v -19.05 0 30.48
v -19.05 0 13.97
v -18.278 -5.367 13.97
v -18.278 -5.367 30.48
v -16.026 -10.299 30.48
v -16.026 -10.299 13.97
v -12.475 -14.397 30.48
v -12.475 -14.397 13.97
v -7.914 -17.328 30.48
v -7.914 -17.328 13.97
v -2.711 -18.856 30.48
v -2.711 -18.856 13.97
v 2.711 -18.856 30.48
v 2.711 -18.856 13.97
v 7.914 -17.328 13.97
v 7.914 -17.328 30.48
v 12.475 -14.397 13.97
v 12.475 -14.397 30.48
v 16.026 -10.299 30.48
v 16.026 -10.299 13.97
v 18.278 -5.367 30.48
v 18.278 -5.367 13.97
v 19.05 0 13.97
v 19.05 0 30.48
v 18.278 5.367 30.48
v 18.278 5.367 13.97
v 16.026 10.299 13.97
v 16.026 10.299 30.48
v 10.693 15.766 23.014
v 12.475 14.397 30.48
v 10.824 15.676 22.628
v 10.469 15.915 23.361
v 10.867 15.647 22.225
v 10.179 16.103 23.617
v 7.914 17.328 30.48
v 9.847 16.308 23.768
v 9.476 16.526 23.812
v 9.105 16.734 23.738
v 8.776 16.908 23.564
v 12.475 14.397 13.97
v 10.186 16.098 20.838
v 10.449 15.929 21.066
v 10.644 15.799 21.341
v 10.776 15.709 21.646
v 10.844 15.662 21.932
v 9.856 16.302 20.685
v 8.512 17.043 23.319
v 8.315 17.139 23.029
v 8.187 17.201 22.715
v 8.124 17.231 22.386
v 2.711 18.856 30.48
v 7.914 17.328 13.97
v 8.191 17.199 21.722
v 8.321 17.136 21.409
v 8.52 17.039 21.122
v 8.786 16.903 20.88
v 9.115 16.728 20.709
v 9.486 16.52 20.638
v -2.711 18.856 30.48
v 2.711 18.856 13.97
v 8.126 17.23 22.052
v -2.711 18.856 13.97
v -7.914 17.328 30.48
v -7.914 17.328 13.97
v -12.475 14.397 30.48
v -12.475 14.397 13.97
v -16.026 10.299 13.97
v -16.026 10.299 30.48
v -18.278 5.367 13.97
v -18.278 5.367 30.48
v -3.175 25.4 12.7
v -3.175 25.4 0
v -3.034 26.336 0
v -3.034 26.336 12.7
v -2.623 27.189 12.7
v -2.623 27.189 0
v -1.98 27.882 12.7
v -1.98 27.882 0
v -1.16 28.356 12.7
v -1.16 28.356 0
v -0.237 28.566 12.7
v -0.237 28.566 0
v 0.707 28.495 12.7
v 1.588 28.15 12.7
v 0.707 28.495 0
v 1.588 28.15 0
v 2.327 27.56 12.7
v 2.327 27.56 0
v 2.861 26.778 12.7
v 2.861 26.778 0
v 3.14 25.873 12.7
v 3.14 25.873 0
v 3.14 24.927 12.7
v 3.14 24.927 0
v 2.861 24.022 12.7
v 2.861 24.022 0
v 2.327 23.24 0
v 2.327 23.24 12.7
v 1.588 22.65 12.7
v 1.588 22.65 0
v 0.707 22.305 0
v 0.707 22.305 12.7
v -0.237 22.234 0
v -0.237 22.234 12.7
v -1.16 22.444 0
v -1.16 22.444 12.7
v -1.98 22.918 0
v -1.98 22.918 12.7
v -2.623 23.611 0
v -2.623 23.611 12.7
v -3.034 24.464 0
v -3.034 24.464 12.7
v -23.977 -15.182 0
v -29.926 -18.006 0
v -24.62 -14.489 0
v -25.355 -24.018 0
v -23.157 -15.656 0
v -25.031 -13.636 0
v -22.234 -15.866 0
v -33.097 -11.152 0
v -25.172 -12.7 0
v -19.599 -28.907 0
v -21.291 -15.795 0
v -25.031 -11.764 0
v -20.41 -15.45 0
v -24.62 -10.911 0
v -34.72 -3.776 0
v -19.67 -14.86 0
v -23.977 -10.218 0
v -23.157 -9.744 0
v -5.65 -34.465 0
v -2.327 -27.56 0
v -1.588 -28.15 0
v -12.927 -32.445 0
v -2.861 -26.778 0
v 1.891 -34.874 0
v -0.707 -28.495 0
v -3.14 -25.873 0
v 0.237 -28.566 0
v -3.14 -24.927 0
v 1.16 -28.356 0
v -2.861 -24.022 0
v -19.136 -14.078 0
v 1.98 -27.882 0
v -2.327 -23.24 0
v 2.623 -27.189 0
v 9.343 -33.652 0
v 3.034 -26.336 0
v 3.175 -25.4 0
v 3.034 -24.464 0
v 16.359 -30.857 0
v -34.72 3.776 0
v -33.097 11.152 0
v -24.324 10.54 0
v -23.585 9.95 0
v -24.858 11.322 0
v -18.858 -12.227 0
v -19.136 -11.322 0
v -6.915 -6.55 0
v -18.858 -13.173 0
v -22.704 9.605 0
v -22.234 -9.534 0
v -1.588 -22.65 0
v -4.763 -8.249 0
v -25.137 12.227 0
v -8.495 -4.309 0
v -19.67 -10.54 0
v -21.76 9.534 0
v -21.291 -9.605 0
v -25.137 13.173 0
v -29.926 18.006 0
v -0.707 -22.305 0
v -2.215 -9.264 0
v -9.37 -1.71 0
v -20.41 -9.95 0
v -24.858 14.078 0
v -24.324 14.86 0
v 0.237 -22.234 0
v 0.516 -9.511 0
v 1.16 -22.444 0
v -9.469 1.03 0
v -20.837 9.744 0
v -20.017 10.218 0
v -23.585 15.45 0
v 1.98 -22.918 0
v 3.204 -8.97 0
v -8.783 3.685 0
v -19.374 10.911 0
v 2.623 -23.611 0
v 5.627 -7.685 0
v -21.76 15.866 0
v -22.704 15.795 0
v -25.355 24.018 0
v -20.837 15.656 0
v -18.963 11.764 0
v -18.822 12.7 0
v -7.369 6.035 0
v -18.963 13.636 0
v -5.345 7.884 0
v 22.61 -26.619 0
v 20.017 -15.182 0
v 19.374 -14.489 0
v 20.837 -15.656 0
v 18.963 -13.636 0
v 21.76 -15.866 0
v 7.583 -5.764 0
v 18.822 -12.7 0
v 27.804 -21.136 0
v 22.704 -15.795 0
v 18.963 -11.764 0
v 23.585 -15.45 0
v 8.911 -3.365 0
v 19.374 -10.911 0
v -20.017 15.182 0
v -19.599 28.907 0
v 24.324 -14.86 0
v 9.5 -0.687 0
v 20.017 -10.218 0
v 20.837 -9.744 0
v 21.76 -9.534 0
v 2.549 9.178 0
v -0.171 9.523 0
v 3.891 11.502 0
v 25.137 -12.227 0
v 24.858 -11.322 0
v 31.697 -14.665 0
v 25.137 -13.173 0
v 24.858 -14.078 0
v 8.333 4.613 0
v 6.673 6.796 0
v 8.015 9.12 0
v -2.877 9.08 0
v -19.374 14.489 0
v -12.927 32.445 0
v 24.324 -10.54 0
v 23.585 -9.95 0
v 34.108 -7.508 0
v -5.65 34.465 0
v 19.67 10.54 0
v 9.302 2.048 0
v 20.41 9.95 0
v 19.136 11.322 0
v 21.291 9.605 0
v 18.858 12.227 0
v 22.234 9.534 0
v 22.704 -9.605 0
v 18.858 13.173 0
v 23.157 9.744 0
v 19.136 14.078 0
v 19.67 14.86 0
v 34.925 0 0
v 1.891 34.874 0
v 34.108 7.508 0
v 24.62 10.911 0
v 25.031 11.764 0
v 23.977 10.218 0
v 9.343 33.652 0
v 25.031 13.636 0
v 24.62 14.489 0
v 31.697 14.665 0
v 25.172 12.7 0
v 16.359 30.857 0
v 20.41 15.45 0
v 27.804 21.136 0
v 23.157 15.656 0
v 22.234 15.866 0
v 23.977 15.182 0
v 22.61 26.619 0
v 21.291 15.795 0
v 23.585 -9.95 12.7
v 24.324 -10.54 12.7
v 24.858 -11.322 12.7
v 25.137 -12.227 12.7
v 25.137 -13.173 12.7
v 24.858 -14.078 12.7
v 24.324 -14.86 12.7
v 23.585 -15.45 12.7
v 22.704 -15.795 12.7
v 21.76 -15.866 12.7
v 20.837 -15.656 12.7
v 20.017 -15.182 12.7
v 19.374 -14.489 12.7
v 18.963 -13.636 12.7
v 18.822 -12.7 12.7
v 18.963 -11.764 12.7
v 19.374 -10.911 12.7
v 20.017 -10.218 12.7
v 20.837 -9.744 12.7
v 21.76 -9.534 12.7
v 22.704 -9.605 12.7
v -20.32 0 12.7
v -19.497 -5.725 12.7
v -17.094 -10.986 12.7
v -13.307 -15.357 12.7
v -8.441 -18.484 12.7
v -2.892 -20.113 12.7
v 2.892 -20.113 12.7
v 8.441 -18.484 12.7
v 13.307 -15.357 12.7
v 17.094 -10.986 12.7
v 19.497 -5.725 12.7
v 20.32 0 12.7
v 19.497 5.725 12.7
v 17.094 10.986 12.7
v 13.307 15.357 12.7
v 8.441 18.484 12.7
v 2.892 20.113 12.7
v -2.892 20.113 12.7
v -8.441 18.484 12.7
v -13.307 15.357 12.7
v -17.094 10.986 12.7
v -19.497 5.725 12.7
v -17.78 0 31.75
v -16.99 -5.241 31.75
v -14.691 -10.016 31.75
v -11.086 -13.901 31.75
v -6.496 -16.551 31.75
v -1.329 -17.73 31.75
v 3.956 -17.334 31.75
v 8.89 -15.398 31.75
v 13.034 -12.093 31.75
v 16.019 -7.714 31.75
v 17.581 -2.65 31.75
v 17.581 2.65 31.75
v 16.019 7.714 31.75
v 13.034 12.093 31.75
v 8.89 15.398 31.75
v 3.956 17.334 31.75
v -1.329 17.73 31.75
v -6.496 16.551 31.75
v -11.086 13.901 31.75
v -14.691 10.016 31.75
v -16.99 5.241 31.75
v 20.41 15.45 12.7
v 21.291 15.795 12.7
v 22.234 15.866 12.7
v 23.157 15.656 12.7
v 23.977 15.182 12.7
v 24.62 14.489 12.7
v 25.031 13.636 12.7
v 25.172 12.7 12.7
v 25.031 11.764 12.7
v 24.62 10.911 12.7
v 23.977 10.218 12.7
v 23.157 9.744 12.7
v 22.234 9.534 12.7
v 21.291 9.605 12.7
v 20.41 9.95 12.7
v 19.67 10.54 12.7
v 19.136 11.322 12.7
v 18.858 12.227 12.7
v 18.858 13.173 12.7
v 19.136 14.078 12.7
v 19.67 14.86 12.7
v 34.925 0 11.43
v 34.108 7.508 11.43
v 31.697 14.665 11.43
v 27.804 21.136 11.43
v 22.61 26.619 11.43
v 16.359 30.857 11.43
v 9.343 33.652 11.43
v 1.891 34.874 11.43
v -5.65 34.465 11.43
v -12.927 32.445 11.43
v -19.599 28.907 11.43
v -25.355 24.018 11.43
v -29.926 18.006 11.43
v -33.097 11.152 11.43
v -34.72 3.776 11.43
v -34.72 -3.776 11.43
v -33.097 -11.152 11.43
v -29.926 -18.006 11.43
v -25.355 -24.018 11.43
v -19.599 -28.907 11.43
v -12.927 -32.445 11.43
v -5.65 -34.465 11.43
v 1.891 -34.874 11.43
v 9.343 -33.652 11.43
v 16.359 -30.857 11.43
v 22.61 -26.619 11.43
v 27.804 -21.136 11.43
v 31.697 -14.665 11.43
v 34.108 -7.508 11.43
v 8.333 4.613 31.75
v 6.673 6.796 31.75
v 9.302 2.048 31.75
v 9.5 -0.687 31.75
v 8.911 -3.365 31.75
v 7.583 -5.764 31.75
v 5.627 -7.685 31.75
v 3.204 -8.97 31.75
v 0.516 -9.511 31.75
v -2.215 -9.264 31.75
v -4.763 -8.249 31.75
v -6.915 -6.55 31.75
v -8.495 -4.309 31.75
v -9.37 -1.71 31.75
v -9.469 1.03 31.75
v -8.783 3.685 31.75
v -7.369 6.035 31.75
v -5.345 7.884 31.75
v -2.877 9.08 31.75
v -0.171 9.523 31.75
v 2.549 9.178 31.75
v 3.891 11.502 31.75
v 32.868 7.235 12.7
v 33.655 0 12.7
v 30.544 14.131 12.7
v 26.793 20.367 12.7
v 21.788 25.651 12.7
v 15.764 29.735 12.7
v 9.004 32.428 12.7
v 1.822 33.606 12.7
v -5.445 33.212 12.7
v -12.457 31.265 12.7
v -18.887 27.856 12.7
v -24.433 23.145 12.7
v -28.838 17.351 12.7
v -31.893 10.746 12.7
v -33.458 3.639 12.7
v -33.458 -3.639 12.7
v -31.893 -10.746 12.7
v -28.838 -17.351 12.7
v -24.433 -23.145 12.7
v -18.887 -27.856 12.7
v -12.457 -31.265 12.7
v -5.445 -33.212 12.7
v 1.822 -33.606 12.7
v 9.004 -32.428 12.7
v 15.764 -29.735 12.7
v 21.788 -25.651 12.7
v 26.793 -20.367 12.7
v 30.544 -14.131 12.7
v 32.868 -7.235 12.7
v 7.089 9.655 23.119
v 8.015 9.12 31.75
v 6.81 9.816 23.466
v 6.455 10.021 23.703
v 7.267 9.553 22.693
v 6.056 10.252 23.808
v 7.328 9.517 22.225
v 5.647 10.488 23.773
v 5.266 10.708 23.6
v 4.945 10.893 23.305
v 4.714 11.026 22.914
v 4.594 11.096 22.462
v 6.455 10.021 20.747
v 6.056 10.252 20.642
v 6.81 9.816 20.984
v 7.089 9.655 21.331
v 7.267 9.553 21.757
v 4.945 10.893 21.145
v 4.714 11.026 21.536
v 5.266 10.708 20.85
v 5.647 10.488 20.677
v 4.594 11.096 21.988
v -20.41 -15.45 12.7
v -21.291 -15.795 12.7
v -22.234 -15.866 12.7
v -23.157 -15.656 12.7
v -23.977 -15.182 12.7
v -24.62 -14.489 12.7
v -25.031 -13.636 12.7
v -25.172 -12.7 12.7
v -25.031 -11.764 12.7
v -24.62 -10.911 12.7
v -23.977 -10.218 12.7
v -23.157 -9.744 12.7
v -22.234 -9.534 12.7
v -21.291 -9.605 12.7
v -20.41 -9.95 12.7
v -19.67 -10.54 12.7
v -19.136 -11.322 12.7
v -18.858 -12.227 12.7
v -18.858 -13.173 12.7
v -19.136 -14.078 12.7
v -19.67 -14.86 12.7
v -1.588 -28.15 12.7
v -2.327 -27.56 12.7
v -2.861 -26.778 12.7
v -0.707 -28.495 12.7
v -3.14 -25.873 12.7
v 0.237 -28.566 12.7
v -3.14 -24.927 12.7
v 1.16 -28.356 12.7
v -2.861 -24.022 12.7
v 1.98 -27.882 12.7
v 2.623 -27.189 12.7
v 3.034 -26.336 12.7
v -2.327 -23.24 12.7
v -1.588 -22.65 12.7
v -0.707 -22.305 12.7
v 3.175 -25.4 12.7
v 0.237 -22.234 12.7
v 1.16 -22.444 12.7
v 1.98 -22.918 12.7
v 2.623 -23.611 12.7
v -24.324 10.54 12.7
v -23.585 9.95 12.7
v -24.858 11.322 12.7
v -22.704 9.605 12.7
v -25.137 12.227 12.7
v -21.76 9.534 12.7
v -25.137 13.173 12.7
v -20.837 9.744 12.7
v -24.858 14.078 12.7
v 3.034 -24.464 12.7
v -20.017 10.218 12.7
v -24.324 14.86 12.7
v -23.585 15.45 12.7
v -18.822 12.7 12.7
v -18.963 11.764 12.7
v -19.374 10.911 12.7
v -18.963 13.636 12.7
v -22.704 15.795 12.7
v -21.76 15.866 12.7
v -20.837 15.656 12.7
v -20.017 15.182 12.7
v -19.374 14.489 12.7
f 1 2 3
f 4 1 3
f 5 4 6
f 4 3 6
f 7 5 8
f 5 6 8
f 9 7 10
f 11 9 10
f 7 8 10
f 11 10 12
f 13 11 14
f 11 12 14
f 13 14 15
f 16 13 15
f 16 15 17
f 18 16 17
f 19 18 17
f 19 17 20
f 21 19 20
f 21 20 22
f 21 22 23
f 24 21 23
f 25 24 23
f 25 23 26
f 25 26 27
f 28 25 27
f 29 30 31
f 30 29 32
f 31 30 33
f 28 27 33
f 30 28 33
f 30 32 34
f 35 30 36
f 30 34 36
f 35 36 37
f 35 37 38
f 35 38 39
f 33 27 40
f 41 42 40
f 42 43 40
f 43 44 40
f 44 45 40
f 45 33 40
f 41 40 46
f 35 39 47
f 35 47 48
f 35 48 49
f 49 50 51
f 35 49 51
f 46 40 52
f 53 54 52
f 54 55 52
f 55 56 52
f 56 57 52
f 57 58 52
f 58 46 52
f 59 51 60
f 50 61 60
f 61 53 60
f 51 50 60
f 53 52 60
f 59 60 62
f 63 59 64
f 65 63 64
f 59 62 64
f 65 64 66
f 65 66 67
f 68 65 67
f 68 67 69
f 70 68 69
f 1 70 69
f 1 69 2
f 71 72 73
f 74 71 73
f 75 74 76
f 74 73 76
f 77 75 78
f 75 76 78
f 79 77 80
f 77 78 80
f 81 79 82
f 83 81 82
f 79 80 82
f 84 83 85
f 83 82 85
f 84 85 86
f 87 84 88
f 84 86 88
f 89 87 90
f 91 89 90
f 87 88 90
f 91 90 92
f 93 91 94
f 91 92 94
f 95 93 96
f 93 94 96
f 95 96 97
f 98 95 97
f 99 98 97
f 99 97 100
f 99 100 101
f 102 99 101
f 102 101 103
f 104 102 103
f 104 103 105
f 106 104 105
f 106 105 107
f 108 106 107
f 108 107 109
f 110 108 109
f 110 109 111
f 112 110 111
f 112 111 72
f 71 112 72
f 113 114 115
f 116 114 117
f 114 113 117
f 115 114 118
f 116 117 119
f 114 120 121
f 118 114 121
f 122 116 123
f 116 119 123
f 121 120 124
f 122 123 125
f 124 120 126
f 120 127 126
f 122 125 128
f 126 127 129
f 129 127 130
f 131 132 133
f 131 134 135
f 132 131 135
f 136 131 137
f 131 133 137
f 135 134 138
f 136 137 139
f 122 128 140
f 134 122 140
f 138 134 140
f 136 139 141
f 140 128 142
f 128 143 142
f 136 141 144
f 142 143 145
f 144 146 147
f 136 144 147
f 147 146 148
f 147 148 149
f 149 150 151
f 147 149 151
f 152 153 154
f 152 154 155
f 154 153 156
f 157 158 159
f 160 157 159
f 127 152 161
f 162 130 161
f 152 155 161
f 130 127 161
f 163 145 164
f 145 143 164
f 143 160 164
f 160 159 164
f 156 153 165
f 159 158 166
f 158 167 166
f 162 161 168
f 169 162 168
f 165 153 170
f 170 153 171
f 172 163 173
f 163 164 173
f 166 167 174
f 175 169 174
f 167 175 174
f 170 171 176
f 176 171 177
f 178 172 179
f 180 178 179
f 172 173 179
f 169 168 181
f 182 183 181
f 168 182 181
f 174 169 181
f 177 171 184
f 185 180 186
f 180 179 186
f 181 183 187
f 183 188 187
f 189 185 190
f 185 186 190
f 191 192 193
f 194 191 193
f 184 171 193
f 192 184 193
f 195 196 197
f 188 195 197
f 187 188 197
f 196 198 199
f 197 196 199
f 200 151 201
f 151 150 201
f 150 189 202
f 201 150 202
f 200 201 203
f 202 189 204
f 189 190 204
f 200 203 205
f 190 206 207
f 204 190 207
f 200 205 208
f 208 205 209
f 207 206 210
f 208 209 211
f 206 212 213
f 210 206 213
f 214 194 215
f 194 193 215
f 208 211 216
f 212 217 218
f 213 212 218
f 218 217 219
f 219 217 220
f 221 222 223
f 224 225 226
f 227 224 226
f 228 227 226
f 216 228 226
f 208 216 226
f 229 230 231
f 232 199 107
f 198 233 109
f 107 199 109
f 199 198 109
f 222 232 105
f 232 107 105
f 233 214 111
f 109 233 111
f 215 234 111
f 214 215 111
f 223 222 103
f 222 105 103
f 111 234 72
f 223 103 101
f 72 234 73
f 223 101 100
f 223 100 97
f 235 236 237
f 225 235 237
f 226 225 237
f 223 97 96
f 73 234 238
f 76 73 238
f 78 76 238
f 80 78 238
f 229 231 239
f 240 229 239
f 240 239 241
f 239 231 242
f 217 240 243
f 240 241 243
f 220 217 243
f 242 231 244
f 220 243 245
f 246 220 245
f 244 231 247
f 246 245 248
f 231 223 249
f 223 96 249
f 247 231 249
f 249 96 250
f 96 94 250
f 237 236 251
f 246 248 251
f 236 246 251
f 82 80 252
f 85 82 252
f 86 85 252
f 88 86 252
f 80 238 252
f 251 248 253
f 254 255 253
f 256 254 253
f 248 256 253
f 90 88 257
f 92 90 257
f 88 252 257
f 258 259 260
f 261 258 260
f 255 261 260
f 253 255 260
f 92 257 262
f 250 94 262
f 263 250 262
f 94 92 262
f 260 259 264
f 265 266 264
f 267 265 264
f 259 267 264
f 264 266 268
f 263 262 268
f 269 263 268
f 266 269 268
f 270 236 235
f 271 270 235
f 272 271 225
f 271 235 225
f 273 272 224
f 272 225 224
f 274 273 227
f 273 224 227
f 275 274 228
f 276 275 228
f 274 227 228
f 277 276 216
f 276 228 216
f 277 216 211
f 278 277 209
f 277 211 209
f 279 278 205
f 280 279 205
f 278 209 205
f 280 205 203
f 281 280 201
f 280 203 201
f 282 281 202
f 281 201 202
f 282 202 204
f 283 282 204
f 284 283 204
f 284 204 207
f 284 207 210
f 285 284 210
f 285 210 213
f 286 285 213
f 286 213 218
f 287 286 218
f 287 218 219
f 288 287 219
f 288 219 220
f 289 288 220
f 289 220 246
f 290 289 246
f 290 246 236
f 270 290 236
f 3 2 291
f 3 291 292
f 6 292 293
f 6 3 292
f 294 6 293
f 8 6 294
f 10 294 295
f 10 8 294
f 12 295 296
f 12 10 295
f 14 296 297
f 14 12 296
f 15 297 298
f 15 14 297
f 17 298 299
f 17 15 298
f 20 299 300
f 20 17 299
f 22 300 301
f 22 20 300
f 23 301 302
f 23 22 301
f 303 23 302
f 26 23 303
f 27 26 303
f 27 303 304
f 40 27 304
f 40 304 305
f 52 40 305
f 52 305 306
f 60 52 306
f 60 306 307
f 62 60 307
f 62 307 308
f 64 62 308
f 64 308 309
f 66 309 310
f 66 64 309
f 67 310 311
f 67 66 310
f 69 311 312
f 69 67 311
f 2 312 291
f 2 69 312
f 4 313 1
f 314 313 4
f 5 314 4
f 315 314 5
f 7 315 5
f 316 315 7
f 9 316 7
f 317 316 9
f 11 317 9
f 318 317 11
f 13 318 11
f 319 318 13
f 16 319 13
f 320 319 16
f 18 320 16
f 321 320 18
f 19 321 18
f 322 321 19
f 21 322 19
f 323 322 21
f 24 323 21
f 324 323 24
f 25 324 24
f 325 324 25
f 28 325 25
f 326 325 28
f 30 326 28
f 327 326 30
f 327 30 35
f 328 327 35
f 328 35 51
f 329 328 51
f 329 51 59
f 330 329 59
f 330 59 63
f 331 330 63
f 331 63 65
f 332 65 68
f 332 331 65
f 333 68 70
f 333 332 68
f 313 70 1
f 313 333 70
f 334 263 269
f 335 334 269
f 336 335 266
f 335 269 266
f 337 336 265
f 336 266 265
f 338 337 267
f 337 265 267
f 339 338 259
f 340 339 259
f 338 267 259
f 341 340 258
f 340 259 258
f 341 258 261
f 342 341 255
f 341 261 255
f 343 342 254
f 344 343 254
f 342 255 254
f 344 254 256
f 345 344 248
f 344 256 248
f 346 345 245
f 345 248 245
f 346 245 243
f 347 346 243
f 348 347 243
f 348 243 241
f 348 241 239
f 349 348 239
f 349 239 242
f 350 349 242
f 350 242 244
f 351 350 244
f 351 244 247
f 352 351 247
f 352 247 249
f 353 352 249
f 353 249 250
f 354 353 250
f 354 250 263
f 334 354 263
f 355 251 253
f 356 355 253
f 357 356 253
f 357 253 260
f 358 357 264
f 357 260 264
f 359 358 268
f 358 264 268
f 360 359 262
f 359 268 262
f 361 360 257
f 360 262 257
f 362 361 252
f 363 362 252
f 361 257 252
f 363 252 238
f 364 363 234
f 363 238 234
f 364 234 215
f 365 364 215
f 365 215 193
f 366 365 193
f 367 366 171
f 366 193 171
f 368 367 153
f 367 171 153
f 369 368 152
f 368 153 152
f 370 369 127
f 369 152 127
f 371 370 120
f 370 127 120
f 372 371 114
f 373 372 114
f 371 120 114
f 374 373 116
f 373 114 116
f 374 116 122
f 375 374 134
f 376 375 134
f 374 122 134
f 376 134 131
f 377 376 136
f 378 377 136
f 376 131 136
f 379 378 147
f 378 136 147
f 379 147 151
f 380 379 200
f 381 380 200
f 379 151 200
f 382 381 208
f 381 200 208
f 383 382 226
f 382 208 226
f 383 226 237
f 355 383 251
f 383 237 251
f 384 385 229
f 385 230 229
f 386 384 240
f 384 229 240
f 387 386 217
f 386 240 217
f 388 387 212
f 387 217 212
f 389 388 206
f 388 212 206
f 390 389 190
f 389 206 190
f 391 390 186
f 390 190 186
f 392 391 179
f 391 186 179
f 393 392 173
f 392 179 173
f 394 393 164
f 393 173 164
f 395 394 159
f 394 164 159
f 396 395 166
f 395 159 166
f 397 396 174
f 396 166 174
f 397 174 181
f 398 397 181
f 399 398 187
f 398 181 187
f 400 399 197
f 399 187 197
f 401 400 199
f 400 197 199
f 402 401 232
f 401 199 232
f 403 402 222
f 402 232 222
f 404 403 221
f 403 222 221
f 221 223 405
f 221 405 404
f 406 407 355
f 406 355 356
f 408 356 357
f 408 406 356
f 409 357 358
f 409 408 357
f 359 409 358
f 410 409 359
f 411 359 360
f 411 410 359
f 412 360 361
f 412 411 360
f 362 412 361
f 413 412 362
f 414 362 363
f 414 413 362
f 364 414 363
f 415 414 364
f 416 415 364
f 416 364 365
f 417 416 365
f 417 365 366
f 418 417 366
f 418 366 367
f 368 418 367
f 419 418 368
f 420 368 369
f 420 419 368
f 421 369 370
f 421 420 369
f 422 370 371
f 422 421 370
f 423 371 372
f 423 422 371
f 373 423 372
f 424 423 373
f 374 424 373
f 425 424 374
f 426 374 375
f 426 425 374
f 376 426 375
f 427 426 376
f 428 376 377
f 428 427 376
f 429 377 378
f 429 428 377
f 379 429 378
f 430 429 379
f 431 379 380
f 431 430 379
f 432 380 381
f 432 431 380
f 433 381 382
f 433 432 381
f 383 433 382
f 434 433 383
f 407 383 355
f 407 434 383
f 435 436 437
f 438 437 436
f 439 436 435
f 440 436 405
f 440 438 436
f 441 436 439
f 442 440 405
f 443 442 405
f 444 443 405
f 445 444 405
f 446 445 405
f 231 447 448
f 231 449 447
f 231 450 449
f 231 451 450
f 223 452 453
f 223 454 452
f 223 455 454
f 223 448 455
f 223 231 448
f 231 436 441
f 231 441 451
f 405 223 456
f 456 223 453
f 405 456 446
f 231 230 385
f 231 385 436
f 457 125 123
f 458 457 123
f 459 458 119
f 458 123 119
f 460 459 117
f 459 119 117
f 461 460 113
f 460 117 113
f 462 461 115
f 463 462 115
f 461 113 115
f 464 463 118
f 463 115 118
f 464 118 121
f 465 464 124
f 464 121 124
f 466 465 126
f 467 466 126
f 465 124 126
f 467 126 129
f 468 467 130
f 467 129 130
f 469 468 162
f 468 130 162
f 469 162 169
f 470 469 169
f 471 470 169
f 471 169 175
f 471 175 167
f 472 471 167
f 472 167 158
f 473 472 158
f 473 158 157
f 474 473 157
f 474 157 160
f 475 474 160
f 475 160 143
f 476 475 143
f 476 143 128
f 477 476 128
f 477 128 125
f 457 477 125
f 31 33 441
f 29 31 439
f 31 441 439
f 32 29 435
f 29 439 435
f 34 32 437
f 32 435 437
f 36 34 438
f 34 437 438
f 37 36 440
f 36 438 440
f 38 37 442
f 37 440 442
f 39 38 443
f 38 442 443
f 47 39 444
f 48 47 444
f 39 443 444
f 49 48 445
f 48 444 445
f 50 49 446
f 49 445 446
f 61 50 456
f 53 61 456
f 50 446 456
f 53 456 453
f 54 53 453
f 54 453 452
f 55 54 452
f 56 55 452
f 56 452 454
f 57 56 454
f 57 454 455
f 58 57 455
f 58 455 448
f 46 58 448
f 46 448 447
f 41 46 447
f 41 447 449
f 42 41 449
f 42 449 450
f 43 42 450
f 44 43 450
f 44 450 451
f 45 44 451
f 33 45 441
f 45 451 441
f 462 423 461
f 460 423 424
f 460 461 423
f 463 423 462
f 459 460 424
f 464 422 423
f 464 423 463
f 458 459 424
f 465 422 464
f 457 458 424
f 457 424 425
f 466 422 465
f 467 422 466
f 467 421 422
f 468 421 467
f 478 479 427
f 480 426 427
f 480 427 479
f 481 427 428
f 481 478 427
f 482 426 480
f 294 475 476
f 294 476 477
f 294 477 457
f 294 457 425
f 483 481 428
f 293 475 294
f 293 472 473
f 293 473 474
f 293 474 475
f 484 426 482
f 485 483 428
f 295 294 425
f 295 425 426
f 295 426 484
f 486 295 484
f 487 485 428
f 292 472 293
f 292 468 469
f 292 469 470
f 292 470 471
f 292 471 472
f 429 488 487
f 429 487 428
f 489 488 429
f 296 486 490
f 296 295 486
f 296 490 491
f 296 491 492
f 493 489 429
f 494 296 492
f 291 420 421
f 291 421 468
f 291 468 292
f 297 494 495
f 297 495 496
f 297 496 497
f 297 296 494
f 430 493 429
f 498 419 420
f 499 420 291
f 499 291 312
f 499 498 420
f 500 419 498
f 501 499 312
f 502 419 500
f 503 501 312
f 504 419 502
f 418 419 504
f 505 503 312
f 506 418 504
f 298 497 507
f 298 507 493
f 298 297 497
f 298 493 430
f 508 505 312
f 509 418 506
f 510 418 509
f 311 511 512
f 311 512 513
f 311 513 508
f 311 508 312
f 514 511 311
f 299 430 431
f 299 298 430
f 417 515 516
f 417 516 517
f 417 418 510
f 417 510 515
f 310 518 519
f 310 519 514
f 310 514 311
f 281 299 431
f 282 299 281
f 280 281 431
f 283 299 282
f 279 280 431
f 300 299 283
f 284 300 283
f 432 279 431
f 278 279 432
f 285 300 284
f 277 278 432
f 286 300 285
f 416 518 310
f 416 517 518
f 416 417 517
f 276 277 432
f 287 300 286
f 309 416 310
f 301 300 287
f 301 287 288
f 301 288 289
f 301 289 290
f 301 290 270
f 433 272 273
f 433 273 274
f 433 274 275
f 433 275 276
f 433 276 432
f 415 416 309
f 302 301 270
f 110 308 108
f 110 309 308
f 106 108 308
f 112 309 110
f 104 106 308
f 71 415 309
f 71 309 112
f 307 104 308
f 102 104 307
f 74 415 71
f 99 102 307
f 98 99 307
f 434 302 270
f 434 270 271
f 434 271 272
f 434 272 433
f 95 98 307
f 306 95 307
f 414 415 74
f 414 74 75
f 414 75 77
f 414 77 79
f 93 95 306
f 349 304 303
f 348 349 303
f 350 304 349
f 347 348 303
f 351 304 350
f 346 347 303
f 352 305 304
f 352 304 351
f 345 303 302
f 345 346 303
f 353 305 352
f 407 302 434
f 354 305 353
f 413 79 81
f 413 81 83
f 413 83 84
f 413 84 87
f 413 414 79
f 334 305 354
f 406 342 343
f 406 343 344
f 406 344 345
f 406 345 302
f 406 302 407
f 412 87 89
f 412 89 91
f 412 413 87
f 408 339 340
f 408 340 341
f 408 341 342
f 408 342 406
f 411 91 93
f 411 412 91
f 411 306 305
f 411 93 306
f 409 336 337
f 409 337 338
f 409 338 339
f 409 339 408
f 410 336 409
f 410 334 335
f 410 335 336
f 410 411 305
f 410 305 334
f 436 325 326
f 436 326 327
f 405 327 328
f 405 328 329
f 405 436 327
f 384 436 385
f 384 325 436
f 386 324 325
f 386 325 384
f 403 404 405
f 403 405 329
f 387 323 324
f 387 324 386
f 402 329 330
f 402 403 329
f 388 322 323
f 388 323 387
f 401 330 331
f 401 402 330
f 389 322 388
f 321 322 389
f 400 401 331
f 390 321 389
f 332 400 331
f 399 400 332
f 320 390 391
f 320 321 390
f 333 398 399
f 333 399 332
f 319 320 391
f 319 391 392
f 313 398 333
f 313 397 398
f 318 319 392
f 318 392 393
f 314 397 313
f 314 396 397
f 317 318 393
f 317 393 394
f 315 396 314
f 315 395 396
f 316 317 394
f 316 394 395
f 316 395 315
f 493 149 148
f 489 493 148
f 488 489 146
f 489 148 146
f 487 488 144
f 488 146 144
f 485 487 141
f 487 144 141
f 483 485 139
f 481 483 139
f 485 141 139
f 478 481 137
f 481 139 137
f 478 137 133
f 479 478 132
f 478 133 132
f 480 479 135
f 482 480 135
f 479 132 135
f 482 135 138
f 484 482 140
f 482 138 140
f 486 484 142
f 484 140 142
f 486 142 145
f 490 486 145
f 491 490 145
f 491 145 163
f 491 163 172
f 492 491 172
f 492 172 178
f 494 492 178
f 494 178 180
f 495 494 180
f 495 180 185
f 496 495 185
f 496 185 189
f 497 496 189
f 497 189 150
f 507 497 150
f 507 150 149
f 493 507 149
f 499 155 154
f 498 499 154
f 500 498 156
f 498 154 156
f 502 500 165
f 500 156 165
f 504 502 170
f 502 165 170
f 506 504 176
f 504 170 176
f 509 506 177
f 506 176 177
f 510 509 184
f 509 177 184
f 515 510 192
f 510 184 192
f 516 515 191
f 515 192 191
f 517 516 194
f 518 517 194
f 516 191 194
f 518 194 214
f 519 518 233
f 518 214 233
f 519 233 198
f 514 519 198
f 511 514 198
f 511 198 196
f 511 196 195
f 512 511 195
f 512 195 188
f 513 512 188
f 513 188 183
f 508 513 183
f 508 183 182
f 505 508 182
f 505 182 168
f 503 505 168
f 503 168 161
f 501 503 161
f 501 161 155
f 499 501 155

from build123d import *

# Parameters (mm, degrees)
SKETCH1_R          = 34.925
EXTRUDE1_DEPTH     = 12.7
SKETCH2_R          = 19.05
EXTRUDE2_DEPTH     = 19.05
SKETCH3_R          = 3.175
SKETCH3_R_2        = 9.525
CUT_EXTRUDE1_DEPTH = 59.716043378
CIRPATTERN1_COUNT  = 6
CUT_EXTRUDE2_DEPTH = 59.716043378
SKETCH5_R          = 1.5875
CUT_EXTRUDE3_DEPTH = 69.74147002
CHAMFER1_SIZE      = 1.27


with BuildPart() as part:
    # Sketch1 → Extrude1 (new body)
    with BuildSketch(Plane.XY):
        Circle(SKETCH1_R)
    extrude(amount=EXTRUDE1_DEPTH)

    # Sketch2 → Extrude2 (add)
    with BuildSketch(Plane.XY.offset(12.7)):
        with Locations(Location((0, 0, 0), (0, 0, 180))):
            Circle(SKETCH2_R)
    extrude(amount=EXTRUDE2_DEPTH)

    # Sketch3 → Cut-Extrude1 (cut, through all)
    with BuildSketch(Plane(origin=(0, 0, 0), x_dir=(-1, 0, 0), z_dir=(0, 0, -1))):
        with Locations((0, 25.4)):
            Circle(SKETCH3_R)
        Circle(SKETCH3_R_2)
    cut_extrude1 = extrude(amount=-CUT_EXTRUDE1_DEPTH, mode=Mode.SUBTRACT)

    # CirPattern1: Cut-Extrude1 ×6 about axis
    cirpattern1_axis = Axis((0, 0, 0), (0, 0, 1))
    for i in range(1, CIRPATTERN1_COUNT):
        add(cut_extrude1.rotate(cirpattern1_axis, i * 360 / CIRPATTERN1_COUNT), mode=Mode.SUBTRACT)

    # Sketch4 → Cut-Extrude2 (cut, through all)
    with BuildSketch(Plane(origin=(0, 0, 0), x_dir=(-1, 0, 0), z_dir=(0, 0, -1))):
        Polygon((-1.509652007, 7.377293978), (-5.634097993, 4.996043978), (-8.015347993, 9.120489964), (-3.890902007, 11.501739964), align=None)
    extrude(amount=-CUT_EXTRUDE2_DEPTH, mode=Mode.SUBTRACT)

    # Sketch5 → Cut-Extrude3 (cut, through all)
    with BuildSketch(Plane(origin=(5.953125, 10.311114964, 0), x_dir=(0.8660254037844396, -0.4999999999999984, 0), z_dir=(-0.4999999999999984, -0.8660254037844396, 0))):
        with Locations((0, 22.225)):
            Circle(SKETCH5_R)
    extrude(amount=-CUT_EXTRUDE3_DEPTH, mode=Mode.SUBTRACT)

    # Chamfer1
    chamfer1_edges = [part.edges().sort_by_distance(p)[0] for p in [
        (-34.925, 0, 12.7),
        (19.05, 0, 12.7),
        (19.05, 0, 31.75),
    ]]
    chamfer(chamfer1_edges, length=CHAMFER1_SIZE)


solid = part.part
